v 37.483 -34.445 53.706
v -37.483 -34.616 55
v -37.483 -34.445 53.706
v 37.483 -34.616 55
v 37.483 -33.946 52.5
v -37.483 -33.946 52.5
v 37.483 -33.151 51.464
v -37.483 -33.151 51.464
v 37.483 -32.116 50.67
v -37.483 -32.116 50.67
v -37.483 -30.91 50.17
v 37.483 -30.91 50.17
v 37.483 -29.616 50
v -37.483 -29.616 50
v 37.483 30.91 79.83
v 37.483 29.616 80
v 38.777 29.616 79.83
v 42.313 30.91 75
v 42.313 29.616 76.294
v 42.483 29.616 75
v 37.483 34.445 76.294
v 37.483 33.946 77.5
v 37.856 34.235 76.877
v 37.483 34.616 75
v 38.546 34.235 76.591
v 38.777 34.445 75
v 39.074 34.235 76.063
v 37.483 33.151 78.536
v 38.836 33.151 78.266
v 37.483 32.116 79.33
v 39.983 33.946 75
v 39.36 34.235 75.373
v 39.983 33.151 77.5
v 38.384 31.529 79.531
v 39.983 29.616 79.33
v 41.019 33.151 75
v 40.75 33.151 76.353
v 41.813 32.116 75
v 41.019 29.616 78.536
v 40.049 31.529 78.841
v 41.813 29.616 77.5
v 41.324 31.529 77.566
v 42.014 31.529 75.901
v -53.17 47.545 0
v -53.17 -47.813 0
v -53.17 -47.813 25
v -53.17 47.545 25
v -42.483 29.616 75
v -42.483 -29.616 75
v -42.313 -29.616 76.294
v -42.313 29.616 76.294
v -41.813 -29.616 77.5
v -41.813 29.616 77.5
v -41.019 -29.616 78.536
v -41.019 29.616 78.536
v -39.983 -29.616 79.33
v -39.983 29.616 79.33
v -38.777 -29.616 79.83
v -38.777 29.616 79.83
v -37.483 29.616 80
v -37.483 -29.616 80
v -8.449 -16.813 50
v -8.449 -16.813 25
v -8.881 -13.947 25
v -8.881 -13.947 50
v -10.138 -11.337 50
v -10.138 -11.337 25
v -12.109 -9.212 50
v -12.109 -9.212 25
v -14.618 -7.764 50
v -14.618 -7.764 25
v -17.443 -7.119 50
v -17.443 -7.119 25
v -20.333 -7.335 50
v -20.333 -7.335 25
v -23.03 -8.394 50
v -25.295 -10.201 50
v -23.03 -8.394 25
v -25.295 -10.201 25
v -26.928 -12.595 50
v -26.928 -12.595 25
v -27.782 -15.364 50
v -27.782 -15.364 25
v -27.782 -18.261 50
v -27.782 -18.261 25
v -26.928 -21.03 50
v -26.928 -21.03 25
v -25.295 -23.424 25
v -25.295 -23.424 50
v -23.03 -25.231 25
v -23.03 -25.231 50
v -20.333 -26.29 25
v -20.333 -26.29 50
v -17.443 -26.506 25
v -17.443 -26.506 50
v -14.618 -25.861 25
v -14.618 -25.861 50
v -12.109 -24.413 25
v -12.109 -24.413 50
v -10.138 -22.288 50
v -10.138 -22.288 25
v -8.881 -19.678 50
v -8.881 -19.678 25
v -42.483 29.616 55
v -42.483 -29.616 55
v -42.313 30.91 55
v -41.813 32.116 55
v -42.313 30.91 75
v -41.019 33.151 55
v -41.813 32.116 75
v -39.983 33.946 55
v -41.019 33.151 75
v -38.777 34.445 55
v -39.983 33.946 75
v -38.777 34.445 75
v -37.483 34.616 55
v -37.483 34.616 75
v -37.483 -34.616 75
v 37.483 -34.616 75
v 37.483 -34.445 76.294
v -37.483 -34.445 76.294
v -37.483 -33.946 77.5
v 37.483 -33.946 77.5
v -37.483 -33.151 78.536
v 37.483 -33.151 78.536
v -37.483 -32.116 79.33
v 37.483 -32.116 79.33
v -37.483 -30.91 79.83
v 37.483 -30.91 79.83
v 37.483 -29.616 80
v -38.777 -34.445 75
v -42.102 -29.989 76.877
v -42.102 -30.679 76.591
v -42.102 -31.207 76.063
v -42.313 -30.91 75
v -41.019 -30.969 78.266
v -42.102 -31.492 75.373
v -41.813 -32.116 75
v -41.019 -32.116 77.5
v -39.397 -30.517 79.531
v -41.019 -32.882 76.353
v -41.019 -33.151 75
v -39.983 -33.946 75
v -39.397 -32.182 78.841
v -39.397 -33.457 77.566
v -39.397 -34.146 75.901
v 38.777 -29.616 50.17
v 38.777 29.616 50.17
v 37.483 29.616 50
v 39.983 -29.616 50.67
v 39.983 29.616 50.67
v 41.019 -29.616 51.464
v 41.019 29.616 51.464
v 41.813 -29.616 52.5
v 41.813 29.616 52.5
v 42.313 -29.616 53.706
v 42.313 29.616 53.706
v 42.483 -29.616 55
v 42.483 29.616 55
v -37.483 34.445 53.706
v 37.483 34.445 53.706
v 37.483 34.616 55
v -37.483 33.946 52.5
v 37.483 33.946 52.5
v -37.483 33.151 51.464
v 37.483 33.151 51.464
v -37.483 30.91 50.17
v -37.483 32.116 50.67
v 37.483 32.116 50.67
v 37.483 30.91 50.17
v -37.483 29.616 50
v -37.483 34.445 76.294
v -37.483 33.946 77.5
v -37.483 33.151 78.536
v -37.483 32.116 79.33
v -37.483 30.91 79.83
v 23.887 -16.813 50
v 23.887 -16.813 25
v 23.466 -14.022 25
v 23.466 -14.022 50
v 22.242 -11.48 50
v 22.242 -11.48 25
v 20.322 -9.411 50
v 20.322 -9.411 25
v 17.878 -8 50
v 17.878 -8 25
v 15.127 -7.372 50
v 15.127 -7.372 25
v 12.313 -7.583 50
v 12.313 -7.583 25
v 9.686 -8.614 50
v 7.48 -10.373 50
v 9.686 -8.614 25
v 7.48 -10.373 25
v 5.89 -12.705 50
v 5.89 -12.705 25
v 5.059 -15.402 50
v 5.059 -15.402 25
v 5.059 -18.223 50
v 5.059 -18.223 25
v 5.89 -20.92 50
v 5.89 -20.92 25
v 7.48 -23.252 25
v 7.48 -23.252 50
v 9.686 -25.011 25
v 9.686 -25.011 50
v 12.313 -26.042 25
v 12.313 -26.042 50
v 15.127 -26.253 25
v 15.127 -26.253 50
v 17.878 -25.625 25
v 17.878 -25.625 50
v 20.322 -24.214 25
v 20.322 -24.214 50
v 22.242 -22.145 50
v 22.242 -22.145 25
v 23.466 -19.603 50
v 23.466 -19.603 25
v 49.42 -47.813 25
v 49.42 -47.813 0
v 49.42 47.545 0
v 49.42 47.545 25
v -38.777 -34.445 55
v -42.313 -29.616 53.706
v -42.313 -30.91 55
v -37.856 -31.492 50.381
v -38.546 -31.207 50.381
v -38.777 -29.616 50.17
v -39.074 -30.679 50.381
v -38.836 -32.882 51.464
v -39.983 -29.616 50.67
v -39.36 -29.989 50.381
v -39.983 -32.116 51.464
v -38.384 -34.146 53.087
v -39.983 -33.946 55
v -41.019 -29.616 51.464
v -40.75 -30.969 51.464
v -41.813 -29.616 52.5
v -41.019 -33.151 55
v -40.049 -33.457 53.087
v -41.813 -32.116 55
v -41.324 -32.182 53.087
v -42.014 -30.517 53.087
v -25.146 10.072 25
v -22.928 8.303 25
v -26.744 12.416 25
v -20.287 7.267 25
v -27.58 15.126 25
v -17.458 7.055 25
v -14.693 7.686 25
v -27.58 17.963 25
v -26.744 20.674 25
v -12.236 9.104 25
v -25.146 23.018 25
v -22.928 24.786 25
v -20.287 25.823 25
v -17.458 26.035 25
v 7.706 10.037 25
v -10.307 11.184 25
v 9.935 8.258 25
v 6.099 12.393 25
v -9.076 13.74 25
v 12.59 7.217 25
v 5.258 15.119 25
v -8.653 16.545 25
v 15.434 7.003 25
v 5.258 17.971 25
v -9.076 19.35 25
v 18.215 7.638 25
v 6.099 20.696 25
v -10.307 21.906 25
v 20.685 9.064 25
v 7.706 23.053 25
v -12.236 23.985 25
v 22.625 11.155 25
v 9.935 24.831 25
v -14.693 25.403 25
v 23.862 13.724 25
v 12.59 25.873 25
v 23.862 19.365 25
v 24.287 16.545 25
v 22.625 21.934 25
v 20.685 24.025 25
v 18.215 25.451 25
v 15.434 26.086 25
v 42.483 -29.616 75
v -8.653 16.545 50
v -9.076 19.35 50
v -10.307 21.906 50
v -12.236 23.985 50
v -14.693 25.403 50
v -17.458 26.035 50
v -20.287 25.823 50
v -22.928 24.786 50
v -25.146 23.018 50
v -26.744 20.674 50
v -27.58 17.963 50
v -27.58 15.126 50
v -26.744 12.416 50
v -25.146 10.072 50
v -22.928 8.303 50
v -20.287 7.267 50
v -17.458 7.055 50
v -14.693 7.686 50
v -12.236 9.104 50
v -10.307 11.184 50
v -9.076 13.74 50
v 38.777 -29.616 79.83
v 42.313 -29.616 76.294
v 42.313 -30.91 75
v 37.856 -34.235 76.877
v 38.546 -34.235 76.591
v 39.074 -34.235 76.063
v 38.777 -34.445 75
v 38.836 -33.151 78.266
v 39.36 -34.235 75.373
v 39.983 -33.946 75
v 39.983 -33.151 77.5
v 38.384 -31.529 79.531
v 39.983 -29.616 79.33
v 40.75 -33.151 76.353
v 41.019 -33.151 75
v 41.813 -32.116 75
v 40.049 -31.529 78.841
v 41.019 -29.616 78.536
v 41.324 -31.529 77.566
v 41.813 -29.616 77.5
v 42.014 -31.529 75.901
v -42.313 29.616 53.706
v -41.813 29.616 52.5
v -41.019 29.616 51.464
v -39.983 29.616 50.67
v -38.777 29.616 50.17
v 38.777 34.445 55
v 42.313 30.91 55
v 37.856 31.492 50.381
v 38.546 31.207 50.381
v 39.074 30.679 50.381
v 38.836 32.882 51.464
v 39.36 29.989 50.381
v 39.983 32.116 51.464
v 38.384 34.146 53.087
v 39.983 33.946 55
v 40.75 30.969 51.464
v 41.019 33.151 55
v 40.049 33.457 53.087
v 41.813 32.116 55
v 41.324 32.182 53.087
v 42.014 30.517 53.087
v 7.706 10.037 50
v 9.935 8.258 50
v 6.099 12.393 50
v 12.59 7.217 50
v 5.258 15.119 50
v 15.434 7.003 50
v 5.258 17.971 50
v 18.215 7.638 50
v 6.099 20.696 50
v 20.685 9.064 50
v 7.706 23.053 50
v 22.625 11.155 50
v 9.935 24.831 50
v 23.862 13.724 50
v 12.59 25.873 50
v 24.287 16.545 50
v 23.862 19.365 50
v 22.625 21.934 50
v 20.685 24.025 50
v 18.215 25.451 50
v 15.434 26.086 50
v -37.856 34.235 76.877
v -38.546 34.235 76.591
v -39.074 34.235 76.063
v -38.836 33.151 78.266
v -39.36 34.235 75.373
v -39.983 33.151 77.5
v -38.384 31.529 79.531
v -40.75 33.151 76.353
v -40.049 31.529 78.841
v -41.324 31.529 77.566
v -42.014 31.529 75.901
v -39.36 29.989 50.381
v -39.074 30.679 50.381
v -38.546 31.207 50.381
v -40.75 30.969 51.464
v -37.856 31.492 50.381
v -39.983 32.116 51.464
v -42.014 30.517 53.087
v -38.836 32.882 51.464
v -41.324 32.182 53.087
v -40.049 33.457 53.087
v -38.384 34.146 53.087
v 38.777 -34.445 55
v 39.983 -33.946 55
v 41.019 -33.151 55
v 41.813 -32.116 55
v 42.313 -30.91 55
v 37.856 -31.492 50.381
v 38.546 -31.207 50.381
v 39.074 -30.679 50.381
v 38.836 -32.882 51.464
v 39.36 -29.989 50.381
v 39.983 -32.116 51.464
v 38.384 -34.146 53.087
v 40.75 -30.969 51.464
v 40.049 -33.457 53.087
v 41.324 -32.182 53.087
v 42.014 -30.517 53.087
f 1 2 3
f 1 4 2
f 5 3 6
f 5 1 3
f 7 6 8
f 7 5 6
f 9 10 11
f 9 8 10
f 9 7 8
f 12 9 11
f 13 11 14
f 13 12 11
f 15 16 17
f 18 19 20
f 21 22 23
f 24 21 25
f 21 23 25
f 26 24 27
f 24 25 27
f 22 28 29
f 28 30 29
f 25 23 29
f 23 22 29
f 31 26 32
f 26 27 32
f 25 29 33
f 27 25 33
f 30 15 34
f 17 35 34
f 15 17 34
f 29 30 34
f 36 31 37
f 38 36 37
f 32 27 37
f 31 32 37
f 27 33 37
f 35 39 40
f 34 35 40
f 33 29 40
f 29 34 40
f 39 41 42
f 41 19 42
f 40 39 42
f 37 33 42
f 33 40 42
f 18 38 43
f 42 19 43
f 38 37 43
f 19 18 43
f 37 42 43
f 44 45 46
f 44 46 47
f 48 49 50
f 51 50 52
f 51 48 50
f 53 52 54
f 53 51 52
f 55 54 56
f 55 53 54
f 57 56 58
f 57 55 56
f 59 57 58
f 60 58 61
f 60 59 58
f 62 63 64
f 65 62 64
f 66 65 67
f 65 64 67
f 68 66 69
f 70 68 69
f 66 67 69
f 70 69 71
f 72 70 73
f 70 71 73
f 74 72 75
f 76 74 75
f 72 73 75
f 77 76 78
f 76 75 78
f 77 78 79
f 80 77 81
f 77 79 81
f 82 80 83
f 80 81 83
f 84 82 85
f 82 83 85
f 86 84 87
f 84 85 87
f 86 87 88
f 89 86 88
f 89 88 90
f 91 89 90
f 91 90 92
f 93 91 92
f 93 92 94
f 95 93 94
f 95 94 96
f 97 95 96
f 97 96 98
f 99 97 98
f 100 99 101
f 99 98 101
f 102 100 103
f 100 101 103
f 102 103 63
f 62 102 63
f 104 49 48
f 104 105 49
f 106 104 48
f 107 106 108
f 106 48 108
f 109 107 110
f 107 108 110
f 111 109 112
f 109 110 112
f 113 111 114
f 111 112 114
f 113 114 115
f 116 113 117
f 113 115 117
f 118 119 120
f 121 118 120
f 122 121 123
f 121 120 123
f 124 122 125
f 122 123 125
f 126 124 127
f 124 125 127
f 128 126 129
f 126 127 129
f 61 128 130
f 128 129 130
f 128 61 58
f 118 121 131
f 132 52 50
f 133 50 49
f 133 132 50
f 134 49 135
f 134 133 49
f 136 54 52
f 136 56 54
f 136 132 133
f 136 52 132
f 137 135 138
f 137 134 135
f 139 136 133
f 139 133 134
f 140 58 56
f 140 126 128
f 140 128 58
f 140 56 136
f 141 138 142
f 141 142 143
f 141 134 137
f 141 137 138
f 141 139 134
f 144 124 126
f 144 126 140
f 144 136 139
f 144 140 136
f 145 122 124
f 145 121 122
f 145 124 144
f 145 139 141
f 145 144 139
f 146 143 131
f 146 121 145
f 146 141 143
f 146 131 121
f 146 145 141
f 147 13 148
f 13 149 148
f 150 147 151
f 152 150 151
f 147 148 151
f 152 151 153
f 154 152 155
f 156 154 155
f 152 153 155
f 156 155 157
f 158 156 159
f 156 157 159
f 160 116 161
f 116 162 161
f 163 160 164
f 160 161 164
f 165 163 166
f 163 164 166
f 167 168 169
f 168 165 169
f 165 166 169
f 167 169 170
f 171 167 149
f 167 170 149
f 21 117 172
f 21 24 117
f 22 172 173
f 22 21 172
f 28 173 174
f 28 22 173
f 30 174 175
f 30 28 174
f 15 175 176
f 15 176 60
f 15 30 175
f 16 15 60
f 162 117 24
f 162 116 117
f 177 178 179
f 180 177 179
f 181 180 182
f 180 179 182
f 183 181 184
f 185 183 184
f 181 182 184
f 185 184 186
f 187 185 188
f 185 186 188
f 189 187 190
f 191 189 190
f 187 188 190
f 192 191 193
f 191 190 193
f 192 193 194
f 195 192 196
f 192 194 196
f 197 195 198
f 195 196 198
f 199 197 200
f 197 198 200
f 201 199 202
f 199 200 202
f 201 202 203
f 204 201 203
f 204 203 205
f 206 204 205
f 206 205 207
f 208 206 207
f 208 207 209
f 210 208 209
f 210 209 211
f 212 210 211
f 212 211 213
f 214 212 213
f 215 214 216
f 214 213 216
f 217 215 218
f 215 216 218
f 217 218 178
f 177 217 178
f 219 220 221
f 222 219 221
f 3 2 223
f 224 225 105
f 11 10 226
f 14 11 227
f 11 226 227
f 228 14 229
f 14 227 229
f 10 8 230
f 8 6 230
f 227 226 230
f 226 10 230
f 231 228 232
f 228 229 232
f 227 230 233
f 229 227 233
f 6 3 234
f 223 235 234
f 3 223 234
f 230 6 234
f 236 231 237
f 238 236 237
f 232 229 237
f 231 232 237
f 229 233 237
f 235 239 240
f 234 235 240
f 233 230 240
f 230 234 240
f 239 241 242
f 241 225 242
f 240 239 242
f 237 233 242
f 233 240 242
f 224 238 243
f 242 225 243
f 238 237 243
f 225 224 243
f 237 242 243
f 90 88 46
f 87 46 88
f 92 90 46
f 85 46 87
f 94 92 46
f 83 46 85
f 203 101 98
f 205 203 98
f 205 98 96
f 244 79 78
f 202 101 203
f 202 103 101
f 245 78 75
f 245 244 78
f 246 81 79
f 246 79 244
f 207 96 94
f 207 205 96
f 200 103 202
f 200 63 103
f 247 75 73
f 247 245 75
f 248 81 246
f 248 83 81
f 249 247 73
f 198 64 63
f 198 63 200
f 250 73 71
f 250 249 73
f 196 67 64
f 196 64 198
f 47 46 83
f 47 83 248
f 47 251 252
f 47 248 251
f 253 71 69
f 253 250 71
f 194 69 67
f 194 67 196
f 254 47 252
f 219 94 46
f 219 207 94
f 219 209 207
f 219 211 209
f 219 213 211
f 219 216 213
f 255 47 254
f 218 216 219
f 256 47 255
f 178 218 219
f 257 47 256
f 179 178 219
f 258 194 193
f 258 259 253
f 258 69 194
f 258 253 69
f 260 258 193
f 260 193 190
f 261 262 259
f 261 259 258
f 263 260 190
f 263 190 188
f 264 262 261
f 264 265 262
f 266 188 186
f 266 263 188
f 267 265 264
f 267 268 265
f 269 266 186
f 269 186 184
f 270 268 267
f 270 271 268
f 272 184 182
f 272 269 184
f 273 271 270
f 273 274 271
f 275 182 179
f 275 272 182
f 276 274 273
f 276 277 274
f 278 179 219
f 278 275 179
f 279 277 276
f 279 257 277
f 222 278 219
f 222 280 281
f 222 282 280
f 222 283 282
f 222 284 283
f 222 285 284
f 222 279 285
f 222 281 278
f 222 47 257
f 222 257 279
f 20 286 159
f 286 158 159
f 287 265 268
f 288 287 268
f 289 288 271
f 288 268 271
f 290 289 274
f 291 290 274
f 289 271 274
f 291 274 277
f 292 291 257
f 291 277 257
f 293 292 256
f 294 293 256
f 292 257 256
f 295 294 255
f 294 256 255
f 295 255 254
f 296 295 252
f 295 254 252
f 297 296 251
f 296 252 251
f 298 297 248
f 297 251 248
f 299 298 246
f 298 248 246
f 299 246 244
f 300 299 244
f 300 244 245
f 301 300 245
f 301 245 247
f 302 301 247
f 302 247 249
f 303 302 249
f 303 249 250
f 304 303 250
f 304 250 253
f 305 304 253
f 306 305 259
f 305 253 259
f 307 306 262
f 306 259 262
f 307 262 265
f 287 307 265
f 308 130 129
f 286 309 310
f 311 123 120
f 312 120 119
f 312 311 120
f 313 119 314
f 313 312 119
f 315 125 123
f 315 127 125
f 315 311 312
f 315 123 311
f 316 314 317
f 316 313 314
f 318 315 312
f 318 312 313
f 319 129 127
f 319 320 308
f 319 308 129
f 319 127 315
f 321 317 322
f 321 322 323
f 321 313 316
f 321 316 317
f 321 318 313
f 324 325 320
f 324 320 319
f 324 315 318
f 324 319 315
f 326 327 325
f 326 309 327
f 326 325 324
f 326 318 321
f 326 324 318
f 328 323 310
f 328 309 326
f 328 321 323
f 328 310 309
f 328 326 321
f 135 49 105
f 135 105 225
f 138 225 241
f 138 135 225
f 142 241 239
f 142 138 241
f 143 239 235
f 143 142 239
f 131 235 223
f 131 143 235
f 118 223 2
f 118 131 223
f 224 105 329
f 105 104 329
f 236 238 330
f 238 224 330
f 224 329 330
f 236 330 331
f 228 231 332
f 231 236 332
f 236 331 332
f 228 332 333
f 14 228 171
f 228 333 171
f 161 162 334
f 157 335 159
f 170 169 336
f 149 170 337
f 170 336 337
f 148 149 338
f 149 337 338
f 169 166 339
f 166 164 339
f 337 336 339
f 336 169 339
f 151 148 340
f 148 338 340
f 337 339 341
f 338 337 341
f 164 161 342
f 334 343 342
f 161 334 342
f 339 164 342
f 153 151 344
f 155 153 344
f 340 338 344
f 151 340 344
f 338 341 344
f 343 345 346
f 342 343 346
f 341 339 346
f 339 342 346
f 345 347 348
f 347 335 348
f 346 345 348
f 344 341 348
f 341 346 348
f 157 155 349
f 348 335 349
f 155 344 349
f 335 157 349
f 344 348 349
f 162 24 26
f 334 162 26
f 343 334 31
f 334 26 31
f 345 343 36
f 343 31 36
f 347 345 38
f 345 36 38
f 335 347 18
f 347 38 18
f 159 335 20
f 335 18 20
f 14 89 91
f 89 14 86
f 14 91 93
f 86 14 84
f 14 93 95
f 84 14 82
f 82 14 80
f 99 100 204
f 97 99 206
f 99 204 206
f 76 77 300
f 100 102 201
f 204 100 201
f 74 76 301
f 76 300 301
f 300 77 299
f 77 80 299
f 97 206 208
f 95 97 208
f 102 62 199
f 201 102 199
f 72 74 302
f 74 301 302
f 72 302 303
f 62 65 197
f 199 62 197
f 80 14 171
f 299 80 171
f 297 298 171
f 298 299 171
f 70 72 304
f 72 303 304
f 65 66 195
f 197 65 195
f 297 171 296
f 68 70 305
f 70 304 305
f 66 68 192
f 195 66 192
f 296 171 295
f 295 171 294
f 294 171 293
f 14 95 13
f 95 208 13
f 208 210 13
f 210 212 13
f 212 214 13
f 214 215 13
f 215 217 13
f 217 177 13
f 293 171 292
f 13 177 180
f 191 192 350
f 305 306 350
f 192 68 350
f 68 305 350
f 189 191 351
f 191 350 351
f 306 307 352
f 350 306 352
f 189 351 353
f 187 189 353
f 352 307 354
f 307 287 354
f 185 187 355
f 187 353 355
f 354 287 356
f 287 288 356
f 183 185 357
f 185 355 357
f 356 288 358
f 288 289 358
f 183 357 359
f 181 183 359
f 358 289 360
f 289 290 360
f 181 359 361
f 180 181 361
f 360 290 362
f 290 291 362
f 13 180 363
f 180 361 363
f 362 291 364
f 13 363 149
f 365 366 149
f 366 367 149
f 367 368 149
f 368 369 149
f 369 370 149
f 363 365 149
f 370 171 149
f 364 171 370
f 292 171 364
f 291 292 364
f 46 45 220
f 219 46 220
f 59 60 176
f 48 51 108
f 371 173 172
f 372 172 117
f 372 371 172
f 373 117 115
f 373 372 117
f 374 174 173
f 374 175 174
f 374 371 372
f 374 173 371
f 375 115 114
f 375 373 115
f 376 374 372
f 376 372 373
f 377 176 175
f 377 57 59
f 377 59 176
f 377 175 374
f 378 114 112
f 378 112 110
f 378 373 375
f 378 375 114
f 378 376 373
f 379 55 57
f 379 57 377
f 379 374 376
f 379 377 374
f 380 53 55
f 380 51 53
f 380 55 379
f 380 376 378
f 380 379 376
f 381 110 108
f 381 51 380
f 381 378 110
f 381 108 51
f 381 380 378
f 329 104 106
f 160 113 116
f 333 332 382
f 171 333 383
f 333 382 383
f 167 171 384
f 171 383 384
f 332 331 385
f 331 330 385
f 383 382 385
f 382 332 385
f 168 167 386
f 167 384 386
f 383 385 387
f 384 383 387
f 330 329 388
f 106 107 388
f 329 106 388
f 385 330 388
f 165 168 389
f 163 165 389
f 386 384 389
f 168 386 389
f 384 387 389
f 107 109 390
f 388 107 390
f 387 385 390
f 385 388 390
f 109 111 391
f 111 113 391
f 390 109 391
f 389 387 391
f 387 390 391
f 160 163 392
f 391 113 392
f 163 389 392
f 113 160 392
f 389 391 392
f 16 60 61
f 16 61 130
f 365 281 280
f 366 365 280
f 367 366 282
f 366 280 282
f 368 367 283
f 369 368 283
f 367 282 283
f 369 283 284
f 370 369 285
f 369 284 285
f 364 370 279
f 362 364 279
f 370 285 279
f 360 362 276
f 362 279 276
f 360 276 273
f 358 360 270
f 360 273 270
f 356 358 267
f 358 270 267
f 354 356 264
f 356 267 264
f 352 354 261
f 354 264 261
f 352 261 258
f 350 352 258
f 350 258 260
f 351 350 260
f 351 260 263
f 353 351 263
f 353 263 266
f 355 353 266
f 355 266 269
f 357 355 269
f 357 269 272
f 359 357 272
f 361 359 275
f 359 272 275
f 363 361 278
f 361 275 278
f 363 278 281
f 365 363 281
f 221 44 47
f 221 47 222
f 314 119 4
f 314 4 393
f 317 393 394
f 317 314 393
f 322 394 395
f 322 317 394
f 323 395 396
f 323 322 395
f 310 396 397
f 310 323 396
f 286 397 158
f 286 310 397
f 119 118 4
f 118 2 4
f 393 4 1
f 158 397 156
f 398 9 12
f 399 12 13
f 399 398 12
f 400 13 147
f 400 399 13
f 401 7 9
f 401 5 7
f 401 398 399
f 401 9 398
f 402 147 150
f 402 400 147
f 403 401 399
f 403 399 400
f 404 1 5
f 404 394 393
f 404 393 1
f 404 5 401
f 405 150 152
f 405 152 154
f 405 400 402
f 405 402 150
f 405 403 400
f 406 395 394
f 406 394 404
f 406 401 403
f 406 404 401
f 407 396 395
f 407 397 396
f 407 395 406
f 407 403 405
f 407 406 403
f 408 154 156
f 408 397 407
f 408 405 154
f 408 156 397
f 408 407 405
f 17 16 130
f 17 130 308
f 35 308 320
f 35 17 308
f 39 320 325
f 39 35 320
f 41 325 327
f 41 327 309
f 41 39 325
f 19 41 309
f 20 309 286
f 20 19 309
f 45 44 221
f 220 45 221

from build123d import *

# Parameters (mm, degrees)
F0_W     = 102.589286
F0_H     = 95.357146
F1_DEPTH = 25
F2_R     = 9.568015
F2_R_2   = 9.516545
F2_R_3   = 9.720787
F2_R_4   = 9.466873
F3_DEPTH = 25
F4_W     = 84.966198
F4_H     = 69.23151
F5_DEPTH = 30
F6_R     = 5


with BuildPart() as f1:
    # F0 (on Top) → F1 (new body)
    with BuildSketch(Plane.XY):
        with Locations((-1.875002, -0.13393)):
            Rectangle(F0_W, F0_H)
    extrude(amount=F1_DEPTH)

    # F2 (on face) → F3 (join)
    with BuildSketch(Plane.XY.offset(25)):
        with Locations((14.719443, 16.544643)):
            Circle(F2_R)
        with Locations((-18.169645, 16.544643)):
            Circle(F2_R_2)
        with Locations((-18.169645, -16.812503)):
            Circle(F2_R_3)
        with Locations((14.419641, -16.812503)):
            Circle(F2_R_4)
    extrude(amount=F3_DEPTH)

    # F4 (on face) → F5 (join)
    with BuildSketch(Plane.XY.offset(50)):
        Rectangle(F4_W, F4_H)
    extrude(amount=F5_DEPTH)

    # F6
    f6_edges = [f1.edges().sort_by_distance(p)[0] for p in [
        (42.483099, 0, 80),
        (0, -34.615755, 80),
        (-42.483099, 0, 80),
        (0, 34.615755, 80),
        (42.483099, -34.615755, 65),
        (42.483099, 34.615755, 65),
        (-42.483099, 34.615755, 65),
        (-42.483099, -34.615755, 65),
        (0, -34.615755, 50),
        (-42.483099, 0, 50),
        (0, 34.615755, 50),
        (42.483099, 0, 50),
    ]]
    fillet(f6_edges, radius=F6_R)


solid = f1.part
